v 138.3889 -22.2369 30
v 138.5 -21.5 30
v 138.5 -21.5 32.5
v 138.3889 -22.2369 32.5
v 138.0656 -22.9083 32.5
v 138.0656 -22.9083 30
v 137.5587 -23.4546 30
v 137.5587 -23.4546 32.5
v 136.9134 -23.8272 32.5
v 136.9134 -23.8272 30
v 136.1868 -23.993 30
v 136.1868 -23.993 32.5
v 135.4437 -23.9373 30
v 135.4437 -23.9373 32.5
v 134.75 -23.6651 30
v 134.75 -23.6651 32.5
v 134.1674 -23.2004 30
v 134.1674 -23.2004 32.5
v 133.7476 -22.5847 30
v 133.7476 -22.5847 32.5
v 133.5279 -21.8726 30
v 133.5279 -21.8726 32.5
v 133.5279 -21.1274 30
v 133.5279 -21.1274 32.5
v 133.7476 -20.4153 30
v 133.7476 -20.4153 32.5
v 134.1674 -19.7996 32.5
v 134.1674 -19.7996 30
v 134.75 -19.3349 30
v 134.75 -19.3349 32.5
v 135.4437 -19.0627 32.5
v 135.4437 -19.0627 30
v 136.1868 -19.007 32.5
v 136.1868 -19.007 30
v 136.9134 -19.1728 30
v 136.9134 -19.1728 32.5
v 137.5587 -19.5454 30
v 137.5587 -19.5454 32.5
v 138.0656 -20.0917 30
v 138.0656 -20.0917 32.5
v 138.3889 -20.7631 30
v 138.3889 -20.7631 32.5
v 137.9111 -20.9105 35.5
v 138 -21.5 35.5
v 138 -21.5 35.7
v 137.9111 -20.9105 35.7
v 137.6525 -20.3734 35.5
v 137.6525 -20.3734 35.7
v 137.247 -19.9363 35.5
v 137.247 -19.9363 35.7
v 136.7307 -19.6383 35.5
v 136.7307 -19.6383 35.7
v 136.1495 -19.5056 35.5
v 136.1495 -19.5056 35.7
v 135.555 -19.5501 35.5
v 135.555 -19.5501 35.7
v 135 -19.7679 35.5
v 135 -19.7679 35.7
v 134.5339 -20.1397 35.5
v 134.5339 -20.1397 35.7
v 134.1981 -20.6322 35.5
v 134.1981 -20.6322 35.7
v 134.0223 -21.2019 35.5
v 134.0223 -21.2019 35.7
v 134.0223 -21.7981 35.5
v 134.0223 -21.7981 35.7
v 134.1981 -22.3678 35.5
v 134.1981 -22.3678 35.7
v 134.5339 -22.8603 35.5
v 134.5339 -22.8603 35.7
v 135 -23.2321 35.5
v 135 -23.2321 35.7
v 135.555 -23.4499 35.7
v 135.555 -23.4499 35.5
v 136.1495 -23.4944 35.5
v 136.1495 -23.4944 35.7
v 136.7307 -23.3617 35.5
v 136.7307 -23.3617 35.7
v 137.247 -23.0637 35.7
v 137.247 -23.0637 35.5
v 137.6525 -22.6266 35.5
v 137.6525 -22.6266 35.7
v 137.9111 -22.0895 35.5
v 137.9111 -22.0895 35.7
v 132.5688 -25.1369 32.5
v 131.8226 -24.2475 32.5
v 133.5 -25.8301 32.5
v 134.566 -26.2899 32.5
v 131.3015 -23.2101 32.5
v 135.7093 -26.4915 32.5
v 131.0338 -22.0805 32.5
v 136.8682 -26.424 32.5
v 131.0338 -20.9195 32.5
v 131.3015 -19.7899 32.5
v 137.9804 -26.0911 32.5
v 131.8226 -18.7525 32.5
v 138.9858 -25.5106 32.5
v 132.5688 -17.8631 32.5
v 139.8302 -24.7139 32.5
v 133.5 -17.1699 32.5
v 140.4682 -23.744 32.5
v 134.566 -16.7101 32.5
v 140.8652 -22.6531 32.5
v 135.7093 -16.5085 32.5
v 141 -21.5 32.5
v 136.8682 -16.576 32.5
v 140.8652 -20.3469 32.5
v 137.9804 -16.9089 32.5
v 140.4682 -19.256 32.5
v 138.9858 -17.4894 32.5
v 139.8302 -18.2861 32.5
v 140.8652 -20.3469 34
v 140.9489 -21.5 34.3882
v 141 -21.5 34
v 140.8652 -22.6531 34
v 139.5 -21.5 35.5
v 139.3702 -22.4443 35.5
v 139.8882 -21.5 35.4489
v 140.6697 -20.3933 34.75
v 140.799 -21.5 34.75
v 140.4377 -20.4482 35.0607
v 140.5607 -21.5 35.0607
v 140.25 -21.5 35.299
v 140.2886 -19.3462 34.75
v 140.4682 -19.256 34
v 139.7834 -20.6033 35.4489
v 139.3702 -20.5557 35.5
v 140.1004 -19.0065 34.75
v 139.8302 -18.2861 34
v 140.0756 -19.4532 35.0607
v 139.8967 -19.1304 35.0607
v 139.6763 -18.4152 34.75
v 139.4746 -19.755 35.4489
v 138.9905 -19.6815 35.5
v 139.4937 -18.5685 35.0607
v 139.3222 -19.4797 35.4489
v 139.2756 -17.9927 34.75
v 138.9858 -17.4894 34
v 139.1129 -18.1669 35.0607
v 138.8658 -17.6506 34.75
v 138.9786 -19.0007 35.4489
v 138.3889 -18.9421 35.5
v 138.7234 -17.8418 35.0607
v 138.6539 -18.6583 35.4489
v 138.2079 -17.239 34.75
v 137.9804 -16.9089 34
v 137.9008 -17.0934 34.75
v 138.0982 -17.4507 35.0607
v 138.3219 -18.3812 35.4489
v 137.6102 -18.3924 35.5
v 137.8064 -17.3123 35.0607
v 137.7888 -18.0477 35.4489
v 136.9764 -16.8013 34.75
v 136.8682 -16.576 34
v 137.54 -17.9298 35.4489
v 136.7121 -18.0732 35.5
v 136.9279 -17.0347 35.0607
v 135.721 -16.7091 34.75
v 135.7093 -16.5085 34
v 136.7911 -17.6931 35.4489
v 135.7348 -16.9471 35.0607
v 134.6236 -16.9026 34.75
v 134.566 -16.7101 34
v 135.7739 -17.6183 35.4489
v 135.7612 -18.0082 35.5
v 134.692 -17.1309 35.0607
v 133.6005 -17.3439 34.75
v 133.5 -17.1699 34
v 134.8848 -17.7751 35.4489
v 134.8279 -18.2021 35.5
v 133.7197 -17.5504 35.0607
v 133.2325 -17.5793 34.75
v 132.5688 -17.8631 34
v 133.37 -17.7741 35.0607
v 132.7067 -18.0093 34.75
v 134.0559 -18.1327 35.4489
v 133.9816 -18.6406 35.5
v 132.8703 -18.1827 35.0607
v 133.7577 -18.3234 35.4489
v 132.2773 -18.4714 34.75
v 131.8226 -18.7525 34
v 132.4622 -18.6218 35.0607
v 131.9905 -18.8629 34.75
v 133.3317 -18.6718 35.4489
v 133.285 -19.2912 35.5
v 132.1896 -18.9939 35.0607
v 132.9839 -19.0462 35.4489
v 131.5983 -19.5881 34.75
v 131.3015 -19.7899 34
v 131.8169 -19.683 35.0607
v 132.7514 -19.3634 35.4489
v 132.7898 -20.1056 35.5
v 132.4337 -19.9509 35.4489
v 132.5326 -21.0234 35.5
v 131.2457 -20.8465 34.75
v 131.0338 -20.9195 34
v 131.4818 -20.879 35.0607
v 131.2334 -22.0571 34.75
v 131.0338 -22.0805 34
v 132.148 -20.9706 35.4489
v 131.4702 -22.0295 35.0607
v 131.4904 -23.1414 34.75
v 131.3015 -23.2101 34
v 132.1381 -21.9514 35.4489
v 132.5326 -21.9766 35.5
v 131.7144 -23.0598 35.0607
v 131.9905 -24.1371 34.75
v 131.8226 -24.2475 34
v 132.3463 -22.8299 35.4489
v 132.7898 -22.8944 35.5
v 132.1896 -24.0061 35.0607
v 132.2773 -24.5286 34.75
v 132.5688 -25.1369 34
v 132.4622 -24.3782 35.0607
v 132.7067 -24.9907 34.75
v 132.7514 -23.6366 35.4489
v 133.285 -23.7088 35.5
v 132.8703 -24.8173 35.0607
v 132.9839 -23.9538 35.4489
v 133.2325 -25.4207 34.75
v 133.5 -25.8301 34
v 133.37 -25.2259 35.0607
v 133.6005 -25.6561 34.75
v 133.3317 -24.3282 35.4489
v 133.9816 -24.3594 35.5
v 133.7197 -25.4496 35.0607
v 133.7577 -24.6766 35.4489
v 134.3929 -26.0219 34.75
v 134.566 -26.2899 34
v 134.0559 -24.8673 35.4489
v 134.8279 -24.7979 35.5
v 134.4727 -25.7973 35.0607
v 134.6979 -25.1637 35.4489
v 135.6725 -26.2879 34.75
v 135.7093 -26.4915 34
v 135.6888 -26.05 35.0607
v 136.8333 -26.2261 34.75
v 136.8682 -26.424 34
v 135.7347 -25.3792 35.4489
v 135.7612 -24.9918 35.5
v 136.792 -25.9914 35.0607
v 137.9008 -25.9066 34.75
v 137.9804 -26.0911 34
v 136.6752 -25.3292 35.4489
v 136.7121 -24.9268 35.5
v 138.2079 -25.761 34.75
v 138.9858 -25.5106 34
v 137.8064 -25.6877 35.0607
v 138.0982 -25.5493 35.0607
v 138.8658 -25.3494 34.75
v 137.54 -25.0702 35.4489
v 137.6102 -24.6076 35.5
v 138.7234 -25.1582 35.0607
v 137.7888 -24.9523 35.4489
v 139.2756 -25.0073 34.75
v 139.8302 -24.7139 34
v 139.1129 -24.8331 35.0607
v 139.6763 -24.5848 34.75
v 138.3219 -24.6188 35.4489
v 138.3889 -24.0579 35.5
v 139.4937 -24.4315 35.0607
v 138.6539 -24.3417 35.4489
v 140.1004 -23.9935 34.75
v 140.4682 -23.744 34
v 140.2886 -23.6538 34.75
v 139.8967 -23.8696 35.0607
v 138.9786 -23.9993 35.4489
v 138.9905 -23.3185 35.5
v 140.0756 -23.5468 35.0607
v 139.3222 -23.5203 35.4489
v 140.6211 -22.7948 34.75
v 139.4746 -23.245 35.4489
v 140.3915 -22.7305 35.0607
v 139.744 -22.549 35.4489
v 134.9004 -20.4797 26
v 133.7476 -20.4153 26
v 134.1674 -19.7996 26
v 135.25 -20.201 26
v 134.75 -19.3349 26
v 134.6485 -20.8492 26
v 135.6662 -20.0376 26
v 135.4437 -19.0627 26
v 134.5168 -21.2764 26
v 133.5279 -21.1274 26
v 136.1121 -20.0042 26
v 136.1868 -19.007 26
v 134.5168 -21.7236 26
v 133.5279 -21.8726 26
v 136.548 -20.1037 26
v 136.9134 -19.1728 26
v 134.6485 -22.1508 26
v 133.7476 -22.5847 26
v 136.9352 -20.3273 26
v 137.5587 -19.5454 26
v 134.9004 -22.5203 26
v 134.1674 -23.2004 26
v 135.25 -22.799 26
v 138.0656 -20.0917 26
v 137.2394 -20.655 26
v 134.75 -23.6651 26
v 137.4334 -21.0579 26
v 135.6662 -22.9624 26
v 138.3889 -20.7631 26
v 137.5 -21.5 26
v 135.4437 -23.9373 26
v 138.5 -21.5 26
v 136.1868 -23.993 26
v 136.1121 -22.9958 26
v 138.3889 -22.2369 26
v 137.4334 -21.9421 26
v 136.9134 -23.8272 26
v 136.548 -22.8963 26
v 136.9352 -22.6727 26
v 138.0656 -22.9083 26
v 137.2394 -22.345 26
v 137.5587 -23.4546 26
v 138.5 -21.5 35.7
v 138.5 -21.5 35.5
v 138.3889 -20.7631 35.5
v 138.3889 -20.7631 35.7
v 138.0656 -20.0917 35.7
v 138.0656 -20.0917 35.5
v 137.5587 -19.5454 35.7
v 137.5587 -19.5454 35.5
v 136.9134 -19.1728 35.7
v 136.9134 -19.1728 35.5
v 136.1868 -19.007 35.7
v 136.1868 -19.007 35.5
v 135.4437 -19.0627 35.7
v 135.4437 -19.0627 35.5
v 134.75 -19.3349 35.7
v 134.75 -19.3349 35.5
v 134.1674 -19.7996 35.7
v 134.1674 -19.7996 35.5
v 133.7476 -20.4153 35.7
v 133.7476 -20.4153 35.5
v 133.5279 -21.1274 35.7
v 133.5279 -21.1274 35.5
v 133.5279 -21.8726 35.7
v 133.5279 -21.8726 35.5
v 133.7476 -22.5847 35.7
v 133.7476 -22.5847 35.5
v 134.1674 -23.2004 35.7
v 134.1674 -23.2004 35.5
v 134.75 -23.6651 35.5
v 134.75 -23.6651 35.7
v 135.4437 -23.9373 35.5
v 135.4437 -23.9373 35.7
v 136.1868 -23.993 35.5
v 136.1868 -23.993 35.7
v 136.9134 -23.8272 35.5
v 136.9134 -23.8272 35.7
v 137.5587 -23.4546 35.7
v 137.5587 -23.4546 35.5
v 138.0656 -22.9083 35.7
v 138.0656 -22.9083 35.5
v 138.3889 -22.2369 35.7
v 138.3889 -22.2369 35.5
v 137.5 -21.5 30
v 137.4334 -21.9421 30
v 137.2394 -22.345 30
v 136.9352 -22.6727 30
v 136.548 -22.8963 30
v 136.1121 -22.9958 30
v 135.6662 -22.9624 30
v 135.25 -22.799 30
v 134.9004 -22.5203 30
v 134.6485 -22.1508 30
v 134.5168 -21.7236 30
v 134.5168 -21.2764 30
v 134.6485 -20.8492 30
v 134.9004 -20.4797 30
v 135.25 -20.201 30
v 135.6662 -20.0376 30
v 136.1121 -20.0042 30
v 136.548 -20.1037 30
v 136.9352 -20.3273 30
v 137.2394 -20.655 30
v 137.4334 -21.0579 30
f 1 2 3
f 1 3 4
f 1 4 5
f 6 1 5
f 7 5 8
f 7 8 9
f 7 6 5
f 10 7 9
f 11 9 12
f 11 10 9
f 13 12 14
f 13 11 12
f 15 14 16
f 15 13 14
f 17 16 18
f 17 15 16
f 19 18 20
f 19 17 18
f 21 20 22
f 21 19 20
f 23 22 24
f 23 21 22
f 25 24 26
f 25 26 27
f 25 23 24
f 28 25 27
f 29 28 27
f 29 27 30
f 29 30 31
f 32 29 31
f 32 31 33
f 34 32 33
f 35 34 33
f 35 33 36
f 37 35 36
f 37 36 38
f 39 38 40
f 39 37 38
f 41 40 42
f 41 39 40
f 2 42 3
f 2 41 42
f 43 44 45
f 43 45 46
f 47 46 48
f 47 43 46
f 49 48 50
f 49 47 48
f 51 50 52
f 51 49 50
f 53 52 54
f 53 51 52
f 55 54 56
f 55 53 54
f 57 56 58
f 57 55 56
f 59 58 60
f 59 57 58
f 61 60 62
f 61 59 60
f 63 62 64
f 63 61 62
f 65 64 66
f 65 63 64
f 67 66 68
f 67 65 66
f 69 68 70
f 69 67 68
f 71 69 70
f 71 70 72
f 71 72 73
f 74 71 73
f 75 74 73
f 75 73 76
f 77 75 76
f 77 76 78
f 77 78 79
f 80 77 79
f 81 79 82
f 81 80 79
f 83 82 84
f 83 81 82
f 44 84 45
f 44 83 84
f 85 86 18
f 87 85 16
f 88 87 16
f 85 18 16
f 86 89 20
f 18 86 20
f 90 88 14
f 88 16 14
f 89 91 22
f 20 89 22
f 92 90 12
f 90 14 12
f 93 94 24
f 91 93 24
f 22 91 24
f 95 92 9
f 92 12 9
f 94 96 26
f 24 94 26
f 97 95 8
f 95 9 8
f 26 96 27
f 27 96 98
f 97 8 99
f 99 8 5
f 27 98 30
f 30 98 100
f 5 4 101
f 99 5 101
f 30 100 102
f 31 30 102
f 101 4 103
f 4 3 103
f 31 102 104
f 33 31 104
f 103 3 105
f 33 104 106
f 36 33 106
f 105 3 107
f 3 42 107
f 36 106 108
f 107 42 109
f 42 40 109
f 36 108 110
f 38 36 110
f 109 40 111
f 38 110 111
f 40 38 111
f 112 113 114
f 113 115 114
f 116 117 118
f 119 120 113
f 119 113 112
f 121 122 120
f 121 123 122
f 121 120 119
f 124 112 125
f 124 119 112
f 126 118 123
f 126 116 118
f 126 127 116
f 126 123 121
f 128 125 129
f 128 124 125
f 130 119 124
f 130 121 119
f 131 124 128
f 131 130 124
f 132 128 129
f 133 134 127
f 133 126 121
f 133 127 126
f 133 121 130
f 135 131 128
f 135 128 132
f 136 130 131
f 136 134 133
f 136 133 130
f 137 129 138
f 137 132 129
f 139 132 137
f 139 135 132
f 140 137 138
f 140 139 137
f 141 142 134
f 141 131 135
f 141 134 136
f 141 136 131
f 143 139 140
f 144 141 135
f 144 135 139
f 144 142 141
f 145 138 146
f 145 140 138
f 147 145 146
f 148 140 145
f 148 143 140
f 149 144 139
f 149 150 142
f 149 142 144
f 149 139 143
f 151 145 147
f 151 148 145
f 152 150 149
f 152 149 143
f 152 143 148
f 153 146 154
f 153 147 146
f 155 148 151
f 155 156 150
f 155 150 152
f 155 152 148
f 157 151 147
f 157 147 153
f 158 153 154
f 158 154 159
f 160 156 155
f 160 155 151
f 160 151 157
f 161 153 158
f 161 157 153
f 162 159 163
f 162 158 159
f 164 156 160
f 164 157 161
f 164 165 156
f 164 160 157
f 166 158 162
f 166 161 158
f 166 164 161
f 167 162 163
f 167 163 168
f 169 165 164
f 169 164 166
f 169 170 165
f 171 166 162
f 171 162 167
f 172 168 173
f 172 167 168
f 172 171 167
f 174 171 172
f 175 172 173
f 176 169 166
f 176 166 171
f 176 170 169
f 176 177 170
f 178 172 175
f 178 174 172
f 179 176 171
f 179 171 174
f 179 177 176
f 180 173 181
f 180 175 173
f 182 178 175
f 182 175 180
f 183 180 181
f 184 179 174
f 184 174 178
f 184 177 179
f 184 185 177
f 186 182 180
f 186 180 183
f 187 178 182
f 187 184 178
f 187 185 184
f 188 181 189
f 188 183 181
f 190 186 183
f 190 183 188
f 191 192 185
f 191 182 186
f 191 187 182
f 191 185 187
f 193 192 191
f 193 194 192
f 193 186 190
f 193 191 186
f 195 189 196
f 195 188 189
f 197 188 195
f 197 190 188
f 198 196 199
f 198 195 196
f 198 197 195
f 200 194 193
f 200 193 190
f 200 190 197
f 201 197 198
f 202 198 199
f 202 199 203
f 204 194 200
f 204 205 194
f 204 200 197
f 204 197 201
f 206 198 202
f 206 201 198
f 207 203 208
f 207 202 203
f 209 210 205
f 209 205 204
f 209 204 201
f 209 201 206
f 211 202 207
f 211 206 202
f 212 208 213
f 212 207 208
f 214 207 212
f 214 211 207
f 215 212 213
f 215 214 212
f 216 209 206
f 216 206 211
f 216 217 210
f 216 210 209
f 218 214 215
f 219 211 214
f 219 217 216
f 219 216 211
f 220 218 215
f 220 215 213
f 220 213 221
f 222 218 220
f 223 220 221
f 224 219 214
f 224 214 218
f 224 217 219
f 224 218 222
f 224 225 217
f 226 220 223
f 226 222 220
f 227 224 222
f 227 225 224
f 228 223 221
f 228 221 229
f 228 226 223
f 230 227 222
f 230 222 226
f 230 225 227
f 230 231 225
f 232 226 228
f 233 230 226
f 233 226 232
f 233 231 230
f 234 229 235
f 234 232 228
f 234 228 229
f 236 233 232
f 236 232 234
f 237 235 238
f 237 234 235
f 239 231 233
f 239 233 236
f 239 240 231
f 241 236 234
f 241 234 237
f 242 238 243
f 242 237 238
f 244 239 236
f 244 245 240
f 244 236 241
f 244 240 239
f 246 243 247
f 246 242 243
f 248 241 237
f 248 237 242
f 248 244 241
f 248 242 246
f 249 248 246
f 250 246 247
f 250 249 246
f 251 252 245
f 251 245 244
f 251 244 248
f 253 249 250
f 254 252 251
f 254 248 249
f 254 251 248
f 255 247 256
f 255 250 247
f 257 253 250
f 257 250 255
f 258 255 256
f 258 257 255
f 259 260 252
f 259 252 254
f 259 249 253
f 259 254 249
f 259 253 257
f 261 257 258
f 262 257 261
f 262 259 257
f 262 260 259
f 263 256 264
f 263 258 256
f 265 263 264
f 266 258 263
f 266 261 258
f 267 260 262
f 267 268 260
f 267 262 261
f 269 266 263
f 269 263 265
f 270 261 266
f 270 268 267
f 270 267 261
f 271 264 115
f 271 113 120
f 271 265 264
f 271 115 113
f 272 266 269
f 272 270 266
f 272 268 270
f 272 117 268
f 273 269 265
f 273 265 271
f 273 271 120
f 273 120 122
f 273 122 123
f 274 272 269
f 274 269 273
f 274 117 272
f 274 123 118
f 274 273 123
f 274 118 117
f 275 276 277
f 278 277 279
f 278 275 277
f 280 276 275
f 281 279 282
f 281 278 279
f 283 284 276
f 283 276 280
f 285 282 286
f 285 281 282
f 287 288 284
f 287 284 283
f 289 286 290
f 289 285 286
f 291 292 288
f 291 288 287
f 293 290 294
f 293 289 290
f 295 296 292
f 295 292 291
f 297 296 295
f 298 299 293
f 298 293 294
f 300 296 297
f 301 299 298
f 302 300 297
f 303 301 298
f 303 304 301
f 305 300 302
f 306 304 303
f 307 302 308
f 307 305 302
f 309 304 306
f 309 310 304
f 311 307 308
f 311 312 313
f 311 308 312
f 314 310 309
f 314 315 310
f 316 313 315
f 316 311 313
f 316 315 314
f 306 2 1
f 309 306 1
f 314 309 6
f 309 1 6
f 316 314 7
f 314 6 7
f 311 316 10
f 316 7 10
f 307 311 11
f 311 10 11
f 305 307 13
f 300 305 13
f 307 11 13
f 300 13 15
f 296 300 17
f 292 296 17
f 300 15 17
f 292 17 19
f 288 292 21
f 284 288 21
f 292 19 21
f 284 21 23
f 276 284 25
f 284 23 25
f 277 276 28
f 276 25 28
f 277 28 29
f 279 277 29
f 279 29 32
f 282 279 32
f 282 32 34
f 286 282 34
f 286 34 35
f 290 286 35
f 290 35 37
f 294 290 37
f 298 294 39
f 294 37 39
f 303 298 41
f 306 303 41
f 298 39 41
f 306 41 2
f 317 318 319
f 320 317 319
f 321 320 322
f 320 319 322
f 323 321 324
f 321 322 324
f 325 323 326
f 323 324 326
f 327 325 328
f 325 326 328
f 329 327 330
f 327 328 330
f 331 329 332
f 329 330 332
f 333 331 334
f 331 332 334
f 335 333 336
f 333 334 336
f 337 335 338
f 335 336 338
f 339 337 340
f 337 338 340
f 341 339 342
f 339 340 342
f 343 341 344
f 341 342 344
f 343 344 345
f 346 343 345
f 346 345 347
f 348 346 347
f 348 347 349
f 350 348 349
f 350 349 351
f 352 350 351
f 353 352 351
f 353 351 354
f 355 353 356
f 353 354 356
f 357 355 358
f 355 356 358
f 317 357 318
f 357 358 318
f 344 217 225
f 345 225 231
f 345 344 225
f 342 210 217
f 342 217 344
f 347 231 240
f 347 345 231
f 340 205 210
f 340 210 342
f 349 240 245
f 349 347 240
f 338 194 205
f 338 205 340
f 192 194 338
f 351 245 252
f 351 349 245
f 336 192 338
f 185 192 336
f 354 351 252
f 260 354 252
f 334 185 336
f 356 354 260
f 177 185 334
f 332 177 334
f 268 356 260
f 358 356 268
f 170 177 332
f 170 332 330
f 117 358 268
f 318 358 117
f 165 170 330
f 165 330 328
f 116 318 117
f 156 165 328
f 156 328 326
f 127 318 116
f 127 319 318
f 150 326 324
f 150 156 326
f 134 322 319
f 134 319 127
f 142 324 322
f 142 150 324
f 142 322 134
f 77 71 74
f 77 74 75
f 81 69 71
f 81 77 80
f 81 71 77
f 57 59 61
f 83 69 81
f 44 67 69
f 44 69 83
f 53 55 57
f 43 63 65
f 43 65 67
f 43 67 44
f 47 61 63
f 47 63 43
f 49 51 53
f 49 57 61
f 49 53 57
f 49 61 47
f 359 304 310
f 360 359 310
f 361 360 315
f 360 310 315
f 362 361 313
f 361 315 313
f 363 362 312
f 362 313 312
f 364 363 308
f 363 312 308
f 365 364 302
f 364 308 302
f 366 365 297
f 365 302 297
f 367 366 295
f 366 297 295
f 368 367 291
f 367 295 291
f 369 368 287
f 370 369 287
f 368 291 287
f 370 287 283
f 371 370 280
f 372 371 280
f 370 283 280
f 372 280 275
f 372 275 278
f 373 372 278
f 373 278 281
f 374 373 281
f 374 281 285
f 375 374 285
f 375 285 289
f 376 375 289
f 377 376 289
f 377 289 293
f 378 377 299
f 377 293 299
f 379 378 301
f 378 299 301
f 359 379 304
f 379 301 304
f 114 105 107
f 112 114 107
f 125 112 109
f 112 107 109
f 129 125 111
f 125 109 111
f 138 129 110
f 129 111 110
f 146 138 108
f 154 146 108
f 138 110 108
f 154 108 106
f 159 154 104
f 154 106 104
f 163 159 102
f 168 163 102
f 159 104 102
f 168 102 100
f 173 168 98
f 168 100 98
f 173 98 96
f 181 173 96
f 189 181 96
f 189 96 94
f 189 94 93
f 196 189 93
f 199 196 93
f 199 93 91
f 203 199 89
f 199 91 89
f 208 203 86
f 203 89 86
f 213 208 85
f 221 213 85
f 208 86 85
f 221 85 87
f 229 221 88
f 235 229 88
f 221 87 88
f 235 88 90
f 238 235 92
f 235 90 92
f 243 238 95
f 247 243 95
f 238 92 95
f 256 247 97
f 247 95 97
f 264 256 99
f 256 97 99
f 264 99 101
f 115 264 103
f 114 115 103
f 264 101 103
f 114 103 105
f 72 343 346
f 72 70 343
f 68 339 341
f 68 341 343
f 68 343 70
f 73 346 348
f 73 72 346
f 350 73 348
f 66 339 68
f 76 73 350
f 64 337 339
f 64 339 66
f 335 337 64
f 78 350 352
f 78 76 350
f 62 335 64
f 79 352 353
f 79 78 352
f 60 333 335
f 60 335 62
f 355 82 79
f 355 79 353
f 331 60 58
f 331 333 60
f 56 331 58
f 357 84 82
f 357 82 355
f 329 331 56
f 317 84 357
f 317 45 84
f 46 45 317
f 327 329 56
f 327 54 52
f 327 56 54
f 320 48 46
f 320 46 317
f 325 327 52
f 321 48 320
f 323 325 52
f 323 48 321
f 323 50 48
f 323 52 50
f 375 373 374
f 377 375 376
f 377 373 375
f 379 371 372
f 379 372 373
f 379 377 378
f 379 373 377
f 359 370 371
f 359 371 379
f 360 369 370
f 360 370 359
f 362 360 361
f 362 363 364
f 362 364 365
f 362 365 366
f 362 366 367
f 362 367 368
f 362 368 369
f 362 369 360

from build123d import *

# Parameters (mm, degrees)
SKETCH046_R     = 2.5
PAD023_DEPTH    = 2.5
SKETCH047_R     = 5
PAD024_DEPTH    = 3
FILLET003_R     = 1.5
SKETCH049_R     = 2.5
PAD025_DEPTH    = 4
SKETCH050_R     = 1.5
POCKET026_DEPTH = 4
SKETCH092_R     = 2.5
SKETCH092_R_2   = 2
PAD058_DEPTH    = 0.2


with BuildPart() as part:
    # Sketch046 → Pad023 (new body)
    with BuildSketch(Plane(origin=(0, 0, 30), x_dir=(1, 0, 0), z_dir=(0, 0, -1))):
        with Locations((101, 55)):
            Circle(SKETCH046_R)
    extrude(amount=-PAD023_DEPTH)

    # Sketch047 (on Face3 of Pad023) → Pad024 (join)
    with BuildSketch(Plane.XY.offset(32.5)):
        with Locations((101, -55)):
            Circle(SKETCH047_R)
    extrude(amount=PAD024_DEPTH)

    # Fillet003
    fillet003_edges = [part.edges().sort_by_distance(p)[0] for p in [
        (96, -55, 35.5),
    ]]
    fillet(fillet003_edges, radius=FILLET003_R)

    # Sketch049 → Pad025 (join)
    with BuildSketch(Plane(origin=(0, 0, 30), x_dir=(1, 0, 0), z_dir=(0, 0, -1))):
        with Locations((101, 55)):
            Circle(SKETCH049_R)
    extrude(amount=PAD025_DEPTH)

    # Sketch050 (on Face17 of Pad025) → Pocket026 (cut)
    with BuildSketch(Plane(origin=(0, 0, 26), x_dir=(1, 0, 0), z_dir=(0, 0, -1))):
        with Locations((101, 55)):
            Circle(SKETCH050_R)
    extrude(amount=-POCKET026_DEPTH, mode=Mode.SUBTRACT)


with BuildPart() as part_1:
    # Body002 placement: moved
    add(part.part.moved(Location((75, 0, 0))))

    # Sketch092 (on Face4 of Clone006) → Pad058 (new body)
    with BuildSketch(Plane(origin=(75, 0, 35.5), x_dir=(1, 0, 0), z_dir=(0, 0, 1))):
        with Locations((101, -55)):
            Circle(SKETCH092_R)
        with Locations((101, -55)):
            Circle(SKETCH092_R_2, mode=Mode.SUBTRACT)
    extrude(amount=PAD058_DEPTH)


with BuildPart() as part_2:
    # Body015 placement: moved
    add(part_1.part.moved(Location((-40, 33.5, 0))))


solid = part_2.part
